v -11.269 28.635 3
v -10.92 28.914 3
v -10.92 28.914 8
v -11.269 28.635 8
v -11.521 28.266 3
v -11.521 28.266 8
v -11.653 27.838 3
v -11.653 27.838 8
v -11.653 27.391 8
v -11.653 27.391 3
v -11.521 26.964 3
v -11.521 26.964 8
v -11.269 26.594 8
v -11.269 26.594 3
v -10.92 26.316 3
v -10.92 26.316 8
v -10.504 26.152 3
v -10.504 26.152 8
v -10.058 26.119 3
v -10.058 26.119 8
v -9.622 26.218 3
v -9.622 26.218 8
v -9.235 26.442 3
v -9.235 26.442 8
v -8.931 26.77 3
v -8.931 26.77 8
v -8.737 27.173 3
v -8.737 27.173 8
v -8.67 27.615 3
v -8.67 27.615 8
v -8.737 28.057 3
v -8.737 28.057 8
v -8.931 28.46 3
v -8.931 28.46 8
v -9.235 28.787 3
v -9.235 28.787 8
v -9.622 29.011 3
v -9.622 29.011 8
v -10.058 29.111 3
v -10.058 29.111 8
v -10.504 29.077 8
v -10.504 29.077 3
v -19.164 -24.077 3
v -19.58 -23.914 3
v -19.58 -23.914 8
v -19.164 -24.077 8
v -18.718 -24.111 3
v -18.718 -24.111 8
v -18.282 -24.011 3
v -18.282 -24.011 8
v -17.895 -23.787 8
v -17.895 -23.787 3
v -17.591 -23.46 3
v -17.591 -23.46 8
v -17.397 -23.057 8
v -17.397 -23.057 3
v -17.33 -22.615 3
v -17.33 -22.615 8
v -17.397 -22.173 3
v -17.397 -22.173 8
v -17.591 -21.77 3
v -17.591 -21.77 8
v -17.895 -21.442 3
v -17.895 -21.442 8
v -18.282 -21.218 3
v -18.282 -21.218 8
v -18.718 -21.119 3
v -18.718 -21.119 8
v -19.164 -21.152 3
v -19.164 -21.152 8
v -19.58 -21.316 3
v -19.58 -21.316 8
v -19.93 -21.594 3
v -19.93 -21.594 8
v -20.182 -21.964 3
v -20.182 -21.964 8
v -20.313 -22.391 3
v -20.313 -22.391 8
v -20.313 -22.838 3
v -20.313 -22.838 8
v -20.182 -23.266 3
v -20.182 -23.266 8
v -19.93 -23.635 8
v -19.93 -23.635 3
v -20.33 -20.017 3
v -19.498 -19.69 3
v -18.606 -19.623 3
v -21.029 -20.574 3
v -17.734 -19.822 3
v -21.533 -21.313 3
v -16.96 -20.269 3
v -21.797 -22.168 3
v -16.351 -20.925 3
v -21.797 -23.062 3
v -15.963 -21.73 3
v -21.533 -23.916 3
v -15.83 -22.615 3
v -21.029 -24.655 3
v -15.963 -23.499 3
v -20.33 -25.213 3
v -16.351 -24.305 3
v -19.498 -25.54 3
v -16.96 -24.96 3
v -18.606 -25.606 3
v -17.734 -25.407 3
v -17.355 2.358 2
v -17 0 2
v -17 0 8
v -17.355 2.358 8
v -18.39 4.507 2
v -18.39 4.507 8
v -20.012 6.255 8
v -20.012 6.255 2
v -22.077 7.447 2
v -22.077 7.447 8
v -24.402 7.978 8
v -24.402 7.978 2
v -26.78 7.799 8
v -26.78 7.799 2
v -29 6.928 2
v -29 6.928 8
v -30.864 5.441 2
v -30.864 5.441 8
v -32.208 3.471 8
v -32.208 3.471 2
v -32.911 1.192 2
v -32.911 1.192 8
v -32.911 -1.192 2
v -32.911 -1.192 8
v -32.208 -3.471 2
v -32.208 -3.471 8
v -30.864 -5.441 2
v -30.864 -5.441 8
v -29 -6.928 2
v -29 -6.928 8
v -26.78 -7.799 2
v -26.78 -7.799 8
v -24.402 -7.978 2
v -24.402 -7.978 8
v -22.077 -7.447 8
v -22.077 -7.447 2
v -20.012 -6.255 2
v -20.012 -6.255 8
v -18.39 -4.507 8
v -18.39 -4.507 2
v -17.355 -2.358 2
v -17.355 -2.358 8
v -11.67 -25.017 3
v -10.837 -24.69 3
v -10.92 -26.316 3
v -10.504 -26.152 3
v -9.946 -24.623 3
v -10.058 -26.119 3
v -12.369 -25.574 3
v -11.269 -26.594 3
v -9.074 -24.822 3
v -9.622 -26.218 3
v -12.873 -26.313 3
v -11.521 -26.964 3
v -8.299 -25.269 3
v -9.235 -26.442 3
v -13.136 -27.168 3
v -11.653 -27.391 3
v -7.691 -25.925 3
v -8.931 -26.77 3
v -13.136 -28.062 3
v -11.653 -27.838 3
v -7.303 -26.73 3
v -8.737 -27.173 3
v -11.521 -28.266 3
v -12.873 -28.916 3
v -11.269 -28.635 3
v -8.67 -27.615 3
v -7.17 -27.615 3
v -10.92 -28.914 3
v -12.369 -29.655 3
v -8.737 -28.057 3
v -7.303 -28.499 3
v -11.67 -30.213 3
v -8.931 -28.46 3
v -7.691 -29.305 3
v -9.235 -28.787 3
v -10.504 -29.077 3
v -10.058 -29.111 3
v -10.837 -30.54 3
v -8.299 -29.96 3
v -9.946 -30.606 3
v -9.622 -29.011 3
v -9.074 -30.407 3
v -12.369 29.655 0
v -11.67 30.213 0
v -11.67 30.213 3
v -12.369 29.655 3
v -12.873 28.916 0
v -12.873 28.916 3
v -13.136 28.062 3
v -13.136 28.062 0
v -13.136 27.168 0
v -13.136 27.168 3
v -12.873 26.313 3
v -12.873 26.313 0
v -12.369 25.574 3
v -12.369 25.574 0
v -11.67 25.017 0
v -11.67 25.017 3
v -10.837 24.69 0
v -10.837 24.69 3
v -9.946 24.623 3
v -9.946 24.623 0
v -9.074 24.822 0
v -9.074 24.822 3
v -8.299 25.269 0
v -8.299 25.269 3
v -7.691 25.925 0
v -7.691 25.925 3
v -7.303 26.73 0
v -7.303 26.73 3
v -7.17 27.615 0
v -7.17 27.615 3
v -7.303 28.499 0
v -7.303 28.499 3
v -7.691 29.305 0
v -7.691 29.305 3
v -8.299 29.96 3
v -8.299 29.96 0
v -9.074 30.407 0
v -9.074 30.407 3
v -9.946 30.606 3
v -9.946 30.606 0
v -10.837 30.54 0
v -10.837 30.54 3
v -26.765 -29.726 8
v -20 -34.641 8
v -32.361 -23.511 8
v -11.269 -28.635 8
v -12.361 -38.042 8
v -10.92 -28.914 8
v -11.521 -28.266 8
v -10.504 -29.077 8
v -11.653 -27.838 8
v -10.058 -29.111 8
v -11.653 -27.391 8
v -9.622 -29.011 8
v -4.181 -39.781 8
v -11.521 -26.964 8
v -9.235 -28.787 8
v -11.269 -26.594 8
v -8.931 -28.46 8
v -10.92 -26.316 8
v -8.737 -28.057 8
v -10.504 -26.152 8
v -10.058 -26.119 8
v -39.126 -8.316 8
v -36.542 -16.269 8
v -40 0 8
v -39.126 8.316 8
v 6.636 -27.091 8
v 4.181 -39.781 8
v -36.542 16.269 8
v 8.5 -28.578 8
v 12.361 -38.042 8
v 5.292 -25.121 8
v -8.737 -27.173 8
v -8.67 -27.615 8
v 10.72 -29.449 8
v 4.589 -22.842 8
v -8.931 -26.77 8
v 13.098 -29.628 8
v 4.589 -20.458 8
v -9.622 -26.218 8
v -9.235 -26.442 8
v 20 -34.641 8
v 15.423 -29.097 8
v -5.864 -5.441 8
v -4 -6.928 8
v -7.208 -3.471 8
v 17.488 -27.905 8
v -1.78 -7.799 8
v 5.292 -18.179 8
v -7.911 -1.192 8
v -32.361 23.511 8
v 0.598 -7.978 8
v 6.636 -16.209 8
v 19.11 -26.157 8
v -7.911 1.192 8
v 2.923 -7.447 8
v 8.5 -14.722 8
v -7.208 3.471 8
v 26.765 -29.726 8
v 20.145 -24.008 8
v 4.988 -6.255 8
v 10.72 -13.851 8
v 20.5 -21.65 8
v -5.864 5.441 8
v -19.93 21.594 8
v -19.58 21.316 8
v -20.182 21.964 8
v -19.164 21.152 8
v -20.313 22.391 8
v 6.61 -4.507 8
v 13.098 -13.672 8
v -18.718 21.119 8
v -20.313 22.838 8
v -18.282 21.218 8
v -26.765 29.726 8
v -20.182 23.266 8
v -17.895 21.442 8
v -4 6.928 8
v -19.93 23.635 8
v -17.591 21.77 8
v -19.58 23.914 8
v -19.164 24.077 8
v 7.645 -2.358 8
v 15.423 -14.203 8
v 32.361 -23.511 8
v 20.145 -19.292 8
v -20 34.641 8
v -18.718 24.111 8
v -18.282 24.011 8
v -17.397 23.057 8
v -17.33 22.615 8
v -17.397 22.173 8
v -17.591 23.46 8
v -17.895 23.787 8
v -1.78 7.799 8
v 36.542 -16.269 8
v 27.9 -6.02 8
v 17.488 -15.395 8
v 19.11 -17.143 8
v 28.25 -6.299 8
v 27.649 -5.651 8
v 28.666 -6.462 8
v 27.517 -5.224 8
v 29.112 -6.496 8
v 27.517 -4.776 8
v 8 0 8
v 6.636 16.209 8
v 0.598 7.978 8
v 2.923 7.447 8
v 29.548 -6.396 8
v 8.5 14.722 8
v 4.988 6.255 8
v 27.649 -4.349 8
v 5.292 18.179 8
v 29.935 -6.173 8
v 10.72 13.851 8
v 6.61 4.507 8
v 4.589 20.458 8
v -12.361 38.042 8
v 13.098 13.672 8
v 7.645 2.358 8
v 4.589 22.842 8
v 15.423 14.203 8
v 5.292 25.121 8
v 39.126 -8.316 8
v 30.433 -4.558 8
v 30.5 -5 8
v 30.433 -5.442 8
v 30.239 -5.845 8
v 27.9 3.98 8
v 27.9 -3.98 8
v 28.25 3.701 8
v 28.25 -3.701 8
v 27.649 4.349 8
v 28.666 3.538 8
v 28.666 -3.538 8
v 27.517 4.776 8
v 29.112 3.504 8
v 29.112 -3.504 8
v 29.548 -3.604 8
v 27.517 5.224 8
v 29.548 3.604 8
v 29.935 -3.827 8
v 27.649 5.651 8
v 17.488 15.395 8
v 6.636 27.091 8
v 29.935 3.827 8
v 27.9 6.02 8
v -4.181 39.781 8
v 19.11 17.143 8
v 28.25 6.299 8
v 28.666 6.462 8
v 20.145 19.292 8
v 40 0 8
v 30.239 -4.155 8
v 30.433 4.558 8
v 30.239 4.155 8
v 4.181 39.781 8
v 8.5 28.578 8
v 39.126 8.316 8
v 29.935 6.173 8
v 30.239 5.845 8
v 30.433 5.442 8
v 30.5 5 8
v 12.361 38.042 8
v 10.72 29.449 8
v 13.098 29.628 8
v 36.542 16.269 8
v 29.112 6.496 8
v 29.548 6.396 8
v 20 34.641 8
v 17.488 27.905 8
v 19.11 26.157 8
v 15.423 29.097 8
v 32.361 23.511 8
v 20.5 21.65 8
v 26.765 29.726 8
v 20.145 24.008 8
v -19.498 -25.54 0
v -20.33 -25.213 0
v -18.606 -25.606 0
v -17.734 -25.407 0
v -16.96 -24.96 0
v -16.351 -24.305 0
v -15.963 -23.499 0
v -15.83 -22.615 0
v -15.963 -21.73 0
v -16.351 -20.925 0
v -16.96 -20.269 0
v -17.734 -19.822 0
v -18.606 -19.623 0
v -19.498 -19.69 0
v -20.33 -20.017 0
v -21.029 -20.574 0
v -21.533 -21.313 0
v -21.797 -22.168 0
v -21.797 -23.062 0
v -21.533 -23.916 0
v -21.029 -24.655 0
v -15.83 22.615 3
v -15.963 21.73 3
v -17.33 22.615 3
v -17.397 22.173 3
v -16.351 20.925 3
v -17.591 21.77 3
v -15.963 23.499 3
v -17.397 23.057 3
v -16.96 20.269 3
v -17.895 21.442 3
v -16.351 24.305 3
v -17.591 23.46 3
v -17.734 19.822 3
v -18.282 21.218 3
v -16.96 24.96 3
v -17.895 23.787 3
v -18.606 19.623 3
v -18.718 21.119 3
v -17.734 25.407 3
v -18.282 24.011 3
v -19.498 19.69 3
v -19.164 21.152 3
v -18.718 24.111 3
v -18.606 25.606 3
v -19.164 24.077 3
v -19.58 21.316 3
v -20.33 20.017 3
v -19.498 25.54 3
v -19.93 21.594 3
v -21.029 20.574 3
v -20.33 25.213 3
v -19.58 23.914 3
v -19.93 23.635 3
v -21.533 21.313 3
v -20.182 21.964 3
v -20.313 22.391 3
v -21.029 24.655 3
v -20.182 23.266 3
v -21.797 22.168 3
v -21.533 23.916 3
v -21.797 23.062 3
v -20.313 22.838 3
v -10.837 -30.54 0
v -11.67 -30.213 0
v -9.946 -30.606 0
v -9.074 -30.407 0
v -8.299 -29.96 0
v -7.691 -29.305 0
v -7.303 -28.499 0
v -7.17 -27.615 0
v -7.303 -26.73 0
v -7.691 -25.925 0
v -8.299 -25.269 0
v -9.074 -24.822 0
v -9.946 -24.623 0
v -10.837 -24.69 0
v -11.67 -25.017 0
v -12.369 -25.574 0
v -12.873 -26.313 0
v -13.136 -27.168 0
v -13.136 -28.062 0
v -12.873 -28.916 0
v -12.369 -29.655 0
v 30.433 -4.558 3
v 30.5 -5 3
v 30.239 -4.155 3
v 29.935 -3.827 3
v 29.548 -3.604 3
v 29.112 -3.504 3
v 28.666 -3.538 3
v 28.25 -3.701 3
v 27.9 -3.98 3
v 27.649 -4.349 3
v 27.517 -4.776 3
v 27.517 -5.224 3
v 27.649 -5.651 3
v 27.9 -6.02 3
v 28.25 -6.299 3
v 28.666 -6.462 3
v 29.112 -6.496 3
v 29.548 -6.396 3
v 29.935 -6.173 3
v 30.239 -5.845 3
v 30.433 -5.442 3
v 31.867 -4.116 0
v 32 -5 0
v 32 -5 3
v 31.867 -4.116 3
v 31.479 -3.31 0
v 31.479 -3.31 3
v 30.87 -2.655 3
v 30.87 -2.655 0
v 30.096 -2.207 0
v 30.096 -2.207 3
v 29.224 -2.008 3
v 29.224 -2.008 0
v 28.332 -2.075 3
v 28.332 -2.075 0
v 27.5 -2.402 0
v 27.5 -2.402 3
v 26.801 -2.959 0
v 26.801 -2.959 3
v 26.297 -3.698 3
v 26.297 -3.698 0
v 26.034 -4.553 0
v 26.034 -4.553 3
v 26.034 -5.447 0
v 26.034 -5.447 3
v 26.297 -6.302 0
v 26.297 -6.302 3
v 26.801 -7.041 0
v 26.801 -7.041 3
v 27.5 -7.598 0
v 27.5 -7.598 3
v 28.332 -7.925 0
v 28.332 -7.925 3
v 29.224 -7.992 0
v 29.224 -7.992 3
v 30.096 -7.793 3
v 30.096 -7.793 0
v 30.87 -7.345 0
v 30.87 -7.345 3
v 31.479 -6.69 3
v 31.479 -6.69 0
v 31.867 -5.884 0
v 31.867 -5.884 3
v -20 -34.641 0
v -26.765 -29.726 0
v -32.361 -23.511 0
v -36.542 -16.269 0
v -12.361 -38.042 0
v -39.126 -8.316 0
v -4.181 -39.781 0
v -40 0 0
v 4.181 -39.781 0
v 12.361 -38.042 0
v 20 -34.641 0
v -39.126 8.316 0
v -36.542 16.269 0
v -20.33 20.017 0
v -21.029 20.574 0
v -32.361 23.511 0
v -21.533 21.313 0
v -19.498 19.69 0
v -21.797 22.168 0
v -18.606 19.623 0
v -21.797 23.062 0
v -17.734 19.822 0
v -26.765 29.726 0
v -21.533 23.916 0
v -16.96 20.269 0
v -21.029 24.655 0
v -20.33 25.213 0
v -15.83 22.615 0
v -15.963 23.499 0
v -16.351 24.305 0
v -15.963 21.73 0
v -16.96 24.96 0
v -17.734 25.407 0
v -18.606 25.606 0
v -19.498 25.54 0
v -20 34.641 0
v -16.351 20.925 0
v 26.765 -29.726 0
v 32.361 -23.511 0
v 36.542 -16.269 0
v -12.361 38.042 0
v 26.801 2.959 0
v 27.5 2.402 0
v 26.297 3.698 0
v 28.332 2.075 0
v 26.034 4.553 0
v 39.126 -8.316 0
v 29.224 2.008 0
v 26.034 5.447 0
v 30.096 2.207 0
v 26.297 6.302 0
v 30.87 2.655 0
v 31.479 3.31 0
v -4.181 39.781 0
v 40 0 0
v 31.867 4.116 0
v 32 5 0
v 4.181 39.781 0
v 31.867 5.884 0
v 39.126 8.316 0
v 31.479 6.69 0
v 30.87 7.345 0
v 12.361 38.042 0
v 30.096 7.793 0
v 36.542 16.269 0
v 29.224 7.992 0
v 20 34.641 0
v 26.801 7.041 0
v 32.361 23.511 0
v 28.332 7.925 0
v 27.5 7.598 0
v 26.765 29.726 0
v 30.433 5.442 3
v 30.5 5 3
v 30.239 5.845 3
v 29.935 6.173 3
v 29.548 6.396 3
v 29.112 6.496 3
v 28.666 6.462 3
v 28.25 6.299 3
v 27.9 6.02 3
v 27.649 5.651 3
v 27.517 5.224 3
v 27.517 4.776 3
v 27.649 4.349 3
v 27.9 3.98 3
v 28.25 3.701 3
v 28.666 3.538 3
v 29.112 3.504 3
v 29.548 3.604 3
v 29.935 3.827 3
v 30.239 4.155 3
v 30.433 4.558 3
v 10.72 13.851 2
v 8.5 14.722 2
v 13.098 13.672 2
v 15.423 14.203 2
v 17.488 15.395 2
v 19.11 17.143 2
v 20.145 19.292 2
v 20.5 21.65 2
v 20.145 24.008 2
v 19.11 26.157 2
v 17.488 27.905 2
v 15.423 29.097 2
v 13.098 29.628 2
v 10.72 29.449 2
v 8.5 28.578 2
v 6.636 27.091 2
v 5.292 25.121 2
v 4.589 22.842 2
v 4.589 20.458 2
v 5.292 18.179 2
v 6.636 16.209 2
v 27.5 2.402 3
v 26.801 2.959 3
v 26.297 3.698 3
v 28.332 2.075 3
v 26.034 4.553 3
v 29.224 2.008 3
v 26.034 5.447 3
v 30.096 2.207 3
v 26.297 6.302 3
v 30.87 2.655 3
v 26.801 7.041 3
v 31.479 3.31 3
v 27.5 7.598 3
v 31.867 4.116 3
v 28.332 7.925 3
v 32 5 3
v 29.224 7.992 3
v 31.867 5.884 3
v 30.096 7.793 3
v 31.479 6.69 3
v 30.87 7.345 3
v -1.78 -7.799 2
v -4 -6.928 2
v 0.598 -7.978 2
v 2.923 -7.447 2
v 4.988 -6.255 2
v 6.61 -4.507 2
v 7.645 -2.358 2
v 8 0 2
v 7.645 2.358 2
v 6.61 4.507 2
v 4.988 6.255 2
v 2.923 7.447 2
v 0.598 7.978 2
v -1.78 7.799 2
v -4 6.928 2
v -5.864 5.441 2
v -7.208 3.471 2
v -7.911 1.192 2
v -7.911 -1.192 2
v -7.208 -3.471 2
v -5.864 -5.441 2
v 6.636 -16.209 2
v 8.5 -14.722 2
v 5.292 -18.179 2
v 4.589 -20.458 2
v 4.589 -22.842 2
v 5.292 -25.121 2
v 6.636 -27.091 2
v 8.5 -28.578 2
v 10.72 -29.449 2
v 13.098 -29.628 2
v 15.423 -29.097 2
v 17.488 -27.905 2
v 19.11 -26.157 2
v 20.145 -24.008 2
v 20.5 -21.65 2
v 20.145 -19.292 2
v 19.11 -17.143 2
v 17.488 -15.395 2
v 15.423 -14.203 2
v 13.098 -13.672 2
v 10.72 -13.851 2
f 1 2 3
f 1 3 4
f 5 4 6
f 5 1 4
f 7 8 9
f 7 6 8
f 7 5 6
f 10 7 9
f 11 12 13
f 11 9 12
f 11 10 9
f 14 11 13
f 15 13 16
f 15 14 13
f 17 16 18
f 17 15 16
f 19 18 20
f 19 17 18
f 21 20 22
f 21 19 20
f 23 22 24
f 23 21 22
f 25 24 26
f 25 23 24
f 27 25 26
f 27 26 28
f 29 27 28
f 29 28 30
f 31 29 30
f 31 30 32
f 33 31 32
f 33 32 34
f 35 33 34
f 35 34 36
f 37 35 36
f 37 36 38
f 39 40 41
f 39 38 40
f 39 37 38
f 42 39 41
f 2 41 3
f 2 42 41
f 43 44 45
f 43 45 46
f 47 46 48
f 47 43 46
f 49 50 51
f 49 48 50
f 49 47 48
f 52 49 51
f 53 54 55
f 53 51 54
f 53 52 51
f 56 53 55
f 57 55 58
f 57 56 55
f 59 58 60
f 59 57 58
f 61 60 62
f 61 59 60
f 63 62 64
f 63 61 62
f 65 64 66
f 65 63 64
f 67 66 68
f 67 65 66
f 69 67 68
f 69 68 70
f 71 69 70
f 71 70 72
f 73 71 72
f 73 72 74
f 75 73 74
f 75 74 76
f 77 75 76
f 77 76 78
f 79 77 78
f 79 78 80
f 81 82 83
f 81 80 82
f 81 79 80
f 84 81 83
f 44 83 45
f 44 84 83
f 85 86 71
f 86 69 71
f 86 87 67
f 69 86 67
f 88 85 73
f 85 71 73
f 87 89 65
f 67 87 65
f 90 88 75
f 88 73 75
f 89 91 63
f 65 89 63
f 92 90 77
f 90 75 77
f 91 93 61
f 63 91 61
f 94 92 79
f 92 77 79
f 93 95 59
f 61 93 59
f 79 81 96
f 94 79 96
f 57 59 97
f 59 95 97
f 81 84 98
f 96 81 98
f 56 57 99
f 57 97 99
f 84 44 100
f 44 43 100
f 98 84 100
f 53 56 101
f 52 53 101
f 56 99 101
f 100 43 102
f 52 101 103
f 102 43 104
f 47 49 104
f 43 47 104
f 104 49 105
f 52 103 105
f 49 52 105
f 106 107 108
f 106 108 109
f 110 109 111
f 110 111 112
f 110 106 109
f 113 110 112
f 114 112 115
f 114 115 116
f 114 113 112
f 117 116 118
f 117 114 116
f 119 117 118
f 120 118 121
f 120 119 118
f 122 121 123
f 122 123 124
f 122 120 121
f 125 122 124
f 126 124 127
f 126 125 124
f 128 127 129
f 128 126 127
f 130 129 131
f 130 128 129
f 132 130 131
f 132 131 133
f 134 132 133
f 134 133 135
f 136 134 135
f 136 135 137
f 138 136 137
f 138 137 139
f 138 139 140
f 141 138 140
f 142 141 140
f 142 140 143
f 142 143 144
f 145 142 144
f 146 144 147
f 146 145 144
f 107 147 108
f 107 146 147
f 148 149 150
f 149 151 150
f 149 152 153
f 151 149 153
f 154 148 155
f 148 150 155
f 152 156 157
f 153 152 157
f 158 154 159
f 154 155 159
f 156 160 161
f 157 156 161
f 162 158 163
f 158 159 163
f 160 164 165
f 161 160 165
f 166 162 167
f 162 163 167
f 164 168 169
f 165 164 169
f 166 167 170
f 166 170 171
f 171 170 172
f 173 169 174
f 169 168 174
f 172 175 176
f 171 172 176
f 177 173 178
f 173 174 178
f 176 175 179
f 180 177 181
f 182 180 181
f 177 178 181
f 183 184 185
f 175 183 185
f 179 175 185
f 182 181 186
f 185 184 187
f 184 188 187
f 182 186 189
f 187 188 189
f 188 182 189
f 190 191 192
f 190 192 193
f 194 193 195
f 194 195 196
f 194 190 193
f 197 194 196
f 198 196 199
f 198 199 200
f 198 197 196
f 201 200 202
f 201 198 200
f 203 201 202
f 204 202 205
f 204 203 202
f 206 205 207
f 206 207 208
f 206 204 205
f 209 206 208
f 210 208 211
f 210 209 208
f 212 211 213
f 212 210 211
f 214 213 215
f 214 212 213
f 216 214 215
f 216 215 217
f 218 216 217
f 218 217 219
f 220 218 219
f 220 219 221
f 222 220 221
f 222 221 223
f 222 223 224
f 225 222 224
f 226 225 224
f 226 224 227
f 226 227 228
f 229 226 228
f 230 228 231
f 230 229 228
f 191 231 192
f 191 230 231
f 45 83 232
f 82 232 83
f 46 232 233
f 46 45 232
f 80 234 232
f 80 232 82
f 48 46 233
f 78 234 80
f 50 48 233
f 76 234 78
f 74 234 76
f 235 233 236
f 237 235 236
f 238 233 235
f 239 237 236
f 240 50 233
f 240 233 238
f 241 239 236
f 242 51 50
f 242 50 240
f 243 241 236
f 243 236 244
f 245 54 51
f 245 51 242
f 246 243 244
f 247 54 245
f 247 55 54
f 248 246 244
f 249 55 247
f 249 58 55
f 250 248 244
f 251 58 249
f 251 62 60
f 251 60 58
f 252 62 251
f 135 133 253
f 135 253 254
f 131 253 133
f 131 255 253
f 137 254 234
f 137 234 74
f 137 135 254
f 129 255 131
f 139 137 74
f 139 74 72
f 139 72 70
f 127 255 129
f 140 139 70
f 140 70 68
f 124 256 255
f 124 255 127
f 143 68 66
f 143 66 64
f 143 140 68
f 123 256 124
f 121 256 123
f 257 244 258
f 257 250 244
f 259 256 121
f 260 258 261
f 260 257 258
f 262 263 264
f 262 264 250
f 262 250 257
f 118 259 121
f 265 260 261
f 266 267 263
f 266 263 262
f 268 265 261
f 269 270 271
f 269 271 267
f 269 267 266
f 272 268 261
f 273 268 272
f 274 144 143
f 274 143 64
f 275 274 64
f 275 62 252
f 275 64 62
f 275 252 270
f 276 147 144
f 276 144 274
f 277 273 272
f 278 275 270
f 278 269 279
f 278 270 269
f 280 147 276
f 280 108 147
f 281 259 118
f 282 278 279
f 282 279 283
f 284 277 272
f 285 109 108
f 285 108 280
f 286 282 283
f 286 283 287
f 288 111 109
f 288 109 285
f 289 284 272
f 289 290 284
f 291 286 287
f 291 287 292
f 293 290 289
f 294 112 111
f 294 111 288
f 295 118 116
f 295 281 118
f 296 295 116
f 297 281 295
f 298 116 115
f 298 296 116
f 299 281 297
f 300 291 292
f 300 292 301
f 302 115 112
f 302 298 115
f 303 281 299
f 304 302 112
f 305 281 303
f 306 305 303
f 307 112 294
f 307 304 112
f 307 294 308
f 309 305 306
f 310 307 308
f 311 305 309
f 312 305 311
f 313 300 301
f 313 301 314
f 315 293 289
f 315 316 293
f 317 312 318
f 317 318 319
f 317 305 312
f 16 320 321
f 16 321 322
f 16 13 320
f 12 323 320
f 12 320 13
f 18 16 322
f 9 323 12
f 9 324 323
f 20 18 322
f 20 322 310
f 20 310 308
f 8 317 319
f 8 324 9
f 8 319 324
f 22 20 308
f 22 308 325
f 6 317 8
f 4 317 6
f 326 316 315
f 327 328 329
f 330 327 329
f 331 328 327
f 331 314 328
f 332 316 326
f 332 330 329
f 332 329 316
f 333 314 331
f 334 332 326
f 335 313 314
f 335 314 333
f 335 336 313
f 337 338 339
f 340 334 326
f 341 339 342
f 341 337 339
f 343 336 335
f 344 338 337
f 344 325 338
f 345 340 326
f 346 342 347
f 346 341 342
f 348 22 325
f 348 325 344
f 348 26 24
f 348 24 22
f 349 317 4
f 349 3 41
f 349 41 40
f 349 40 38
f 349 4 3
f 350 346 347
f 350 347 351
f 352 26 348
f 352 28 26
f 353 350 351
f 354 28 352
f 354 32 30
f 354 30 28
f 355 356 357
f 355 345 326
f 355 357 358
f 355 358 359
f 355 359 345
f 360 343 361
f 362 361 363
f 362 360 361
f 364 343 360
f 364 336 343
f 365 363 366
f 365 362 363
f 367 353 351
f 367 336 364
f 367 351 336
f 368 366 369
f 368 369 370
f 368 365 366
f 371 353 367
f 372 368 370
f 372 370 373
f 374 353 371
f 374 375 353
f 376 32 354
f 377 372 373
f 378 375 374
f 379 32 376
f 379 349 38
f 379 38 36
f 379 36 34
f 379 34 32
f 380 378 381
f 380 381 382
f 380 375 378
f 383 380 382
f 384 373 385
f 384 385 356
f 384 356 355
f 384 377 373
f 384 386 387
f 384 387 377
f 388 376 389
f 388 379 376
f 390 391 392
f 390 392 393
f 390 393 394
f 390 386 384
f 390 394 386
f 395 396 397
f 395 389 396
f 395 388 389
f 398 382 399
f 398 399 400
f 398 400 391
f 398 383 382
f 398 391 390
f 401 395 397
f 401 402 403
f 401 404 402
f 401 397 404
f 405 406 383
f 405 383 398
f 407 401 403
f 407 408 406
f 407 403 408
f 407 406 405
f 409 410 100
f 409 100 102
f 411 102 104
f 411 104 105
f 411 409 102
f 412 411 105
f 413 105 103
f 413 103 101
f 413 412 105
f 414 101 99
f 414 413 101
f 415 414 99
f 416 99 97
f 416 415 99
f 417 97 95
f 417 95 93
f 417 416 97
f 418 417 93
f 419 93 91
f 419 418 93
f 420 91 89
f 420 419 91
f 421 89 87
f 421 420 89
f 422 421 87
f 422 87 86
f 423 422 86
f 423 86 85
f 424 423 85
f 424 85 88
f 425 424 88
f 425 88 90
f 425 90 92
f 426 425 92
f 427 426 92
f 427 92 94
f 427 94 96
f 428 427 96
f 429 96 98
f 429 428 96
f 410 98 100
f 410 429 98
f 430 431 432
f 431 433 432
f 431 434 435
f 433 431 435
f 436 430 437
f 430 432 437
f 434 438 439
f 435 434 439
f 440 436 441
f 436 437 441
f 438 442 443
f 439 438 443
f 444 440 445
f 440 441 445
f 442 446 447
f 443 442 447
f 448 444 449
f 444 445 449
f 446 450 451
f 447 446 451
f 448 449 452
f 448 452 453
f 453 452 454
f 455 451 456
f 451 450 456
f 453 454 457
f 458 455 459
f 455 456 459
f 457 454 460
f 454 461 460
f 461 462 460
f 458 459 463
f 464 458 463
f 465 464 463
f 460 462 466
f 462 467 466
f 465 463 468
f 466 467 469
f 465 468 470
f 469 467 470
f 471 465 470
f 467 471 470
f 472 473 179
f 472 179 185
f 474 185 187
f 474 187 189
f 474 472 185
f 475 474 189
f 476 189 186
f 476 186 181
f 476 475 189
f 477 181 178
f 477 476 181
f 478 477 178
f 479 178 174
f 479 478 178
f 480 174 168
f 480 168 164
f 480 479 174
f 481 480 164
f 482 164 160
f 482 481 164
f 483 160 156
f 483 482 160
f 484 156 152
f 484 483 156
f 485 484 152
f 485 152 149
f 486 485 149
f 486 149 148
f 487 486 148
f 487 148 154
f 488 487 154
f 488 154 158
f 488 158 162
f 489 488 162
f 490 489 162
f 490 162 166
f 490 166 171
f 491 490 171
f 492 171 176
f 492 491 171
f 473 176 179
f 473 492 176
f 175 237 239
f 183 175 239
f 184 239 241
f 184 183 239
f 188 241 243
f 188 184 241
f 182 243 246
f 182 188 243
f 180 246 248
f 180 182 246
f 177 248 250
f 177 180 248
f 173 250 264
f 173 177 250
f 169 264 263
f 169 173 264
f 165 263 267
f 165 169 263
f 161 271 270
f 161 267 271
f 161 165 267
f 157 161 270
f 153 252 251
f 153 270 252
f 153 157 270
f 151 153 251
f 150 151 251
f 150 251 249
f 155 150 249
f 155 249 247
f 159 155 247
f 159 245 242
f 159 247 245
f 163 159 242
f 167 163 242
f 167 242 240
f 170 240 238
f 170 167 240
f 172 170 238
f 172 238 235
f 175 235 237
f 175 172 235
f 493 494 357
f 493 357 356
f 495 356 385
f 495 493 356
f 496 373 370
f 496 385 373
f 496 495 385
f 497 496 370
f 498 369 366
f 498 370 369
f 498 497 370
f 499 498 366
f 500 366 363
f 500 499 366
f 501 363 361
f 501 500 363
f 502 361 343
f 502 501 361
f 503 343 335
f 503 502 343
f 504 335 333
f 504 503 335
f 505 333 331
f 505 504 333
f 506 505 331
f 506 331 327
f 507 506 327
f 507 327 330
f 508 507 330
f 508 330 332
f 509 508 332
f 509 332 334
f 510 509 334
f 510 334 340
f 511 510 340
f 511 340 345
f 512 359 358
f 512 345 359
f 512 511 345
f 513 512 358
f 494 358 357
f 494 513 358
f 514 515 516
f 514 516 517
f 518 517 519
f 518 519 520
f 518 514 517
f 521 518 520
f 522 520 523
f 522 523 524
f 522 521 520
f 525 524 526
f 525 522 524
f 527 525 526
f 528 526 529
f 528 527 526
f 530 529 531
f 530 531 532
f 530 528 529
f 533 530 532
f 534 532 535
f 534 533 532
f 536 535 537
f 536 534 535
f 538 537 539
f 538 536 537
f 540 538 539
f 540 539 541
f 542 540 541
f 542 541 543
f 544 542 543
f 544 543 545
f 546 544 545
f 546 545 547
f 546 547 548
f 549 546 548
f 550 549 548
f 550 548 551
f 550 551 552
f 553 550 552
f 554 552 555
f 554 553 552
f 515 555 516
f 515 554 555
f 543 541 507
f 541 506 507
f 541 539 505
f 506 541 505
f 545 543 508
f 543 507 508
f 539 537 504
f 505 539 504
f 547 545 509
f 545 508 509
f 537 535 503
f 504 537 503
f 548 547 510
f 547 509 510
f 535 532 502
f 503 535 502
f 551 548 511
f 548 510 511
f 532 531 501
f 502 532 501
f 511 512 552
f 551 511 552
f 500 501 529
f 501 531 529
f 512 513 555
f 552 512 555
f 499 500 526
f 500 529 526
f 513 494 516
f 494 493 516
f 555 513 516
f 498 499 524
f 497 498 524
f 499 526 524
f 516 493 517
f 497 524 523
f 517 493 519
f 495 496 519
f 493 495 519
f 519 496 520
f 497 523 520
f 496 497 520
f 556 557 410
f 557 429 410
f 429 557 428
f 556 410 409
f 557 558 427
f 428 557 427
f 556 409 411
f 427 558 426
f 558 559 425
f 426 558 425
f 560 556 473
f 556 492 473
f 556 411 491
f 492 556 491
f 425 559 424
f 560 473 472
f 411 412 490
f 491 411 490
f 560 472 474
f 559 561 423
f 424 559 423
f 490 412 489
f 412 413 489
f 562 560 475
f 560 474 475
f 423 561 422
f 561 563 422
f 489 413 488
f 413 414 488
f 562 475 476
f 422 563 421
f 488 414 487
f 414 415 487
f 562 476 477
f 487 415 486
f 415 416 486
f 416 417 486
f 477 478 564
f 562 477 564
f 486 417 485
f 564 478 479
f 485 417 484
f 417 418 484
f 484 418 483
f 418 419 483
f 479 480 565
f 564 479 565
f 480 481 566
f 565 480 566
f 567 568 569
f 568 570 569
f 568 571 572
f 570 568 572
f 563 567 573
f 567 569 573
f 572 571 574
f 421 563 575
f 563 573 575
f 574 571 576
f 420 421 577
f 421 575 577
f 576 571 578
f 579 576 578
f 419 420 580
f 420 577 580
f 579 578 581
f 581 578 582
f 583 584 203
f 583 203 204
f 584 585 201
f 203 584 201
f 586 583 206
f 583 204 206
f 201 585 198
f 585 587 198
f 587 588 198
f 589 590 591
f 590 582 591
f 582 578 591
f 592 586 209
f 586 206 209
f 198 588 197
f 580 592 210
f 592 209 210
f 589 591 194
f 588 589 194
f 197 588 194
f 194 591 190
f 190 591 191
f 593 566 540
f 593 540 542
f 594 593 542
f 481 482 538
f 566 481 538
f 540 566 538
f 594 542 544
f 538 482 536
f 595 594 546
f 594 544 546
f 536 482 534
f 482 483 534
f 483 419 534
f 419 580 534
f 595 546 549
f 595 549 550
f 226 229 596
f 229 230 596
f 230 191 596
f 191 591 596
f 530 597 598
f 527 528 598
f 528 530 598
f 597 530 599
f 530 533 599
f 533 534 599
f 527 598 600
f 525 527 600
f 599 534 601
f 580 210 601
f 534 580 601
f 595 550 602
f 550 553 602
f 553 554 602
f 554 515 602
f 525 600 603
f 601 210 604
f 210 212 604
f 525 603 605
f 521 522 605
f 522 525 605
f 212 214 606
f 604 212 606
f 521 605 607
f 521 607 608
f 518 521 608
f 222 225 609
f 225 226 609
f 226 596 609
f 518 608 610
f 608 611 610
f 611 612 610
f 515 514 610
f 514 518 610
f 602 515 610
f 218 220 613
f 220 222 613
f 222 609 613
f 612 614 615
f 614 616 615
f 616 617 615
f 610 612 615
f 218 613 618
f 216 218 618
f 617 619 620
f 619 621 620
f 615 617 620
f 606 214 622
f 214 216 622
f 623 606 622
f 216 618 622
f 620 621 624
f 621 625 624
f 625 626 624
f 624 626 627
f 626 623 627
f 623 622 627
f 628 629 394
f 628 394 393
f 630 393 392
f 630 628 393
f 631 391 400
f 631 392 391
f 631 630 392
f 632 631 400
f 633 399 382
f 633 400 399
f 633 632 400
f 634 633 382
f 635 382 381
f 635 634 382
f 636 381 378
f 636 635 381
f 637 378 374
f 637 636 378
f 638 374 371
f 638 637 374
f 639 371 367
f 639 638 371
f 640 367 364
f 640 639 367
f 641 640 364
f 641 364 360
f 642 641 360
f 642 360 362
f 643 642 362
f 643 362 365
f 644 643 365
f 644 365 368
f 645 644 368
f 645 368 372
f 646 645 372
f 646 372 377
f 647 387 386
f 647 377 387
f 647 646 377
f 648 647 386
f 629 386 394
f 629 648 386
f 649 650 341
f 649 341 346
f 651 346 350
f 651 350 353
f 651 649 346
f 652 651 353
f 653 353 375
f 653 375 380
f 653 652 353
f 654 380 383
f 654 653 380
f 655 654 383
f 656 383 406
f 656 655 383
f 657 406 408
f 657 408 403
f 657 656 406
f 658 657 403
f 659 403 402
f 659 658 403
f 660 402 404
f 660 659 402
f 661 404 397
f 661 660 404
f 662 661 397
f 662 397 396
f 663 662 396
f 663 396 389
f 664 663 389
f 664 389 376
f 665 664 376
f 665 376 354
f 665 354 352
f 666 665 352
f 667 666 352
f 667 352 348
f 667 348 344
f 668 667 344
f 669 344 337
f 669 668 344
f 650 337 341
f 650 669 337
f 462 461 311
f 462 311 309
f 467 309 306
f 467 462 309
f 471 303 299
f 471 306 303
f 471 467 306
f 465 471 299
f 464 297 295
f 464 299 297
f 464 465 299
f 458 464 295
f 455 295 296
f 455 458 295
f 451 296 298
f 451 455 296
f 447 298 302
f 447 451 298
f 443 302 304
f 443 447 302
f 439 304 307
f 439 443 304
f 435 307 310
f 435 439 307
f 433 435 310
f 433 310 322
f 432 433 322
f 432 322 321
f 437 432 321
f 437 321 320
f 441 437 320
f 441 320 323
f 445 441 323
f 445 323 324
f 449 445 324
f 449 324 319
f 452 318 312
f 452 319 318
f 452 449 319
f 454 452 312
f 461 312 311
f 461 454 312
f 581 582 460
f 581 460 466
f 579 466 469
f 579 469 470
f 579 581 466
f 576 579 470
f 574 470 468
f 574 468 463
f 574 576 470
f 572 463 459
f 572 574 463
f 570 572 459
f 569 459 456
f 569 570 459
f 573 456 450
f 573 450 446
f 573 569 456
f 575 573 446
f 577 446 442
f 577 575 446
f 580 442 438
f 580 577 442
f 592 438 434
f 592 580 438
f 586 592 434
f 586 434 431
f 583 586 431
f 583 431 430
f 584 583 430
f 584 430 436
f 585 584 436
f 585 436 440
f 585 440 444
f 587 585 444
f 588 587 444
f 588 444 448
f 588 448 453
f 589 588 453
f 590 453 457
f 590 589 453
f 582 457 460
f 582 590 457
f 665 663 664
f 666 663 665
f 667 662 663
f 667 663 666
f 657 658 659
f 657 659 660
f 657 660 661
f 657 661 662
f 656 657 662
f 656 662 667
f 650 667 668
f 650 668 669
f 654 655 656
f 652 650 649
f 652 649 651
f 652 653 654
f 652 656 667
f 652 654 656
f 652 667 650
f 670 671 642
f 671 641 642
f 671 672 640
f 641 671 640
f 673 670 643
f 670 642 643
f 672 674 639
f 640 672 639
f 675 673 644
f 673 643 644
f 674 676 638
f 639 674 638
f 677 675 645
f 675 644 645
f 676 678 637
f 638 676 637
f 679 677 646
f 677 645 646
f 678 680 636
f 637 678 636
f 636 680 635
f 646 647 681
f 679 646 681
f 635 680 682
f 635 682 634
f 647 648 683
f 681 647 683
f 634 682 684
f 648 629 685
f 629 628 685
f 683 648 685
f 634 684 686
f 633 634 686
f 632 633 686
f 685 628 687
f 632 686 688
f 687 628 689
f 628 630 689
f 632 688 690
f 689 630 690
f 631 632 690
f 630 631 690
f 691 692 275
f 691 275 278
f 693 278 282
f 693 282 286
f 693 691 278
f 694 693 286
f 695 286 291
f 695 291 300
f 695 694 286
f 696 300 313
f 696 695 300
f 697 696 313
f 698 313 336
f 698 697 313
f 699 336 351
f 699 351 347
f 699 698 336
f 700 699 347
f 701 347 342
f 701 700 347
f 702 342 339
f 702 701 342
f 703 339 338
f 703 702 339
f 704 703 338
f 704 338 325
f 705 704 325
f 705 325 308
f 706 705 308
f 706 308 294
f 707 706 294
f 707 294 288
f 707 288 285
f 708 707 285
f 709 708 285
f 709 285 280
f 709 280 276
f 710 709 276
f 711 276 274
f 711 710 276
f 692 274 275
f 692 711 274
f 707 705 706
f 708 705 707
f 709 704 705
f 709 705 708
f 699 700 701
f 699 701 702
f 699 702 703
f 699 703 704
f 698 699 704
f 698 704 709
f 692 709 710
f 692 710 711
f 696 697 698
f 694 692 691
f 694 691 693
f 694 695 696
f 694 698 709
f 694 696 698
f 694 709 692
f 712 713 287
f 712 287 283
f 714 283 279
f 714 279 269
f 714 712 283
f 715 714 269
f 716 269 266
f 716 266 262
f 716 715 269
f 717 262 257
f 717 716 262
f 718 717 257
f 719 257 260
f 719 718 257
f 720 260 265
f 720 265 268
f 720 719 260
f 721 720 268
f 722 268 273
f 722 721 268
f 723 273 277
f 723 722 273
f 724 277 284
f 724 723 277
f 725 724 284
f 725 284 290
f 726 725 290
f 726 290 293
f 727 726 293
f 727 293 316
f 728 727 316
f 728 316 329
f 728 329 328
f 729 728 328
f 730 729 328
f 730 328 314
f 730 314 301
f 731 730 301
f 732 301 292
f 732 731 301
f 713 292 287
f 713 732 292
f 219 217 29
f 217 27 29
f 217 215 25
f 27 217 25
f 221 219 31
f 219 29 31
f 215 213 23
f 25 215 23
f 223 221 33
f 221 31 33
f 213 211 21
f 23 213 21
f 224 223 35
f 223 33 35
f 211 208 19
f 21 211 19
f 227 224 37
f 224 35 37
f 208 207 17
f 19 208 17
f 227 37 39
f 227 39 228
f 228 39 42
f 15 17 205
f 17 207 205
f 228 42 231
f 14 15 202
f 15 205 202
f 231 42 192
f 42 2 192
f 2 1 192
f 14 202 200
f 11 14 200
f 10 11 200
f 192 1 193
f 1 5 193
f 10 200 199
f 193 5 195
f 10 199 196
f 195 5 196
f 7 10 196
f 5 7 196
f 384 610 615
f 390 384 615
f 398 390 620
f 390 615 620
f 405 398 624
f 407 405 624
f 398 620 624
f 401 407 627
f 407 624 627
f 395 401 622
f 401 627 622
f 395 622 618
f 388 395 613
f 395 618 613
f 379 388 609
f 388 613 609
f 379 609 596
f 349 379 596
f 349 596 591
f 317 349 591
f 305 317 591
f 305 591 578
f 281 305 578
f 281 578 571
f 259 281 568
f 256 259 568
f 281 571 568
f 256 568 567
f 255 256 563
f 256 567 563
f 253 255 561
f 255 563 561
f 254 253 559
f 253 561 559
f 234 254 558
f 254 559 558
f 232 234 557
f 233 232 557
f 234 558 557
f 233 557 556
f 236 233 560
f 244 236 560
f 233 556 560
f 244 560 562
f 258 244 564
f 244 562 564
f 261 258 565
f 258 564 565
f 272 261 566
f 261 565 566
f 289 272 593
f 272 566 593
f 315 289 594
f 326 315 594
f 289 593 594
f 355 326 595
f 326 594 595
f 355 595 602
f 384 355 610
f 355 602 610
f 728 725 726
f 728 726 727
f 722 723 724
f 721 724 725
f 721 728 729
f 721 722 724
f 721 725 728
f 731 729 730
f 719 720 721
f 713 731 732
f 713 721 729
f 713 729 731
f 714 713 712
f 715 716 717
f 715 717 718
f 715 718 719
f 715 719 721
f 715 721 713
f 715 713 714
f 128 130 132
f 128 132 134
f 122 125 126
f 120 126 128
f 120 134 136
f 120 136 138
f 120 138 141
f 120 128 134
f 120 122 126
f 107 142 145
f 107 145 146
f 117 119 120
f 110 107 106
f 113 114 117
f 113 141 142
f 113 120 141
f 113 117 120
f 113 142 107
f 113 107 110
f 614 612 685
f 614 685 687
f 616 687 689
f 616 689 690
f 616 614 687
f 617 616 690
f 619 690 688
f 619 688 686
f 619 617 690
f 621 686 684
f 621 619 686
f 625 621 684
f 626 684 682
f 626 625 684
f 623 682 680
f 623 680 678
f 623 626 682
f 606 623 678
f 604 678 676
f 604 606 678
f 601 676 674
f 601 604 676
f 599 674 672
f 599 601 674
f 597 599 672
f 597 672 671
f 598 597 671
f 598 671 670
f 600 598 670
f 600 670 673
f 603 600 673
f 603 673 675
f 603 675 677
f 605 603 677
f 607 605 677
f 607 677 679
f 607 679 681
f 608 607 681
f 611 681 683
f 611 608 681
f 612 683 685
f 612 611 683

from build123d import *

# Parameters (mm, degrees)
CYLINDER271_R               = 8
CYLINDER271_DEPTH           = 6
CYLINDER271_PLACEMENT_ANGLE = 240
CYLINDER272_R               = 3
CYLINDER272_DEPTH           = 3
CYLINDER232_R               = 3
CYLINDER232_DEPTH           = 3
COMPOUND244_PLACEMENT_ANGLE = 240
COMPOUND214_PLACEMENT_ANGLE = 120
CYLINDER233_R               = 1.5
CYLINDER233_DEPTH           = 60
CYLINDER234_R               = 1.5
CYLINDER234_DEPTH           = 60
COMPOUND240_PLACEMENT_ANGLE = 240
COMPOUND215_PLACEMENT_ANGLE = 120
CYLINDER268_R               = 15
CYLINDER268_DEPTH           = 20
CYLINDER269_R               = 8
CYLINDER269_DEPTH           = 6
CYLINDER269_PLACEMENT_ANGLE = 120
CYLINDER231_R               = 8
CYLINDER231_DEPTH           = 6
CYLINDER231_PLACEMENT_ANGLE = 240
CYLINDER270_R               = 8
CYLINDER270_DEPTH           = 6
CYLINDER267_R               = 40
CYLINDER267_DEPTH           = 8


with BuildPart() as v_lec271:
    # Cylinder271 → Cylinder271 (new body)
    with BuildSketch(Plane.XY):
        Circle(CYLINDER271_R)
    extrude(amount=CYLINDER271_DEPTH)


with BuildPart() as v_lec271_1:
    # Cylinder271 placement: moved
    add(v_lec271.part.moved(Location((0, 0, 2))).rotate(Axis((0, 0, 2), (0, 0, 1)), CYLINDER271_PLACEMENT_ANGLE))


with BuildPart() as v_lec272:
    # Cylinder272 → Cylinder272 (new body)
    with BuildSketch(Plane(origin=(29, -5, -6), x_dir=(1, 0, 0), z_dir=(0, 0, 1))):
        Circle(CYLINDER272_R)
    extrude(amount=CYLINDER272_DEPTH)


with BuildPart() as v_lec232:
    # Cylinder232 → Cylinder232 (new body)
    with BuildSketch(Plane(origin=(29, 5, -6), x_dir=(1, 0, 0), z_dir=(0, 0, 1))):
        Circle(CYLINDER232_R)
    extrude(amount=CYLINDER232_DEPTH)


with BuildPart() as compound244:
    # Compound244 base: copy of Válec232
    add(v_lec232.part)

    # Compound244: union Válec272
    add(v_lec272.part)


with BuildPart() as compound244_1:
    # Compound244 placement: moved
    add(compound244.part.moved(Location((0, 0, 6))).rotate(Axis((0, 0, 6), (0, 0, 1)), COMPOUND244_PLACEMENT_ANGLE))


with BuildPart() as compound246:
    # Compound246 base: copy of Válec232
    add(v_lec232.part)

    # Compound246: union Válec272
    add(v_lec272.part)


with BuildPart() as compound246_1:
    # Compound246 placement: moved
    add(compound246.part.moved(Location((0, 0, 6))))


with BuildPart() as compound242:
    # Compound214 base: copy of Válec232
    add(v_lec232.part)

    # Compound214: union Válec272
    add(v_lec272.part)


with BuildPart() as compound242_1:
    # Compound214 placement: moved
    add(compound242.part.moved(Location((0, 0, 6))).rotate(Axis((0, 0, 6), (0, 0, 1)), COMPOUND214_PLACEMENT_ANGLE))

    # Compound242: union Compound244, Compound246
    add(compound244_1.part)
    add(compound246_1.part)


with BuildPart() as v_lec233:
    # Cylinder233 → Cylinder233 (new body)
    with BuildSketch(Plane(origin=(29, -5, -6), x_dir=(1, 0, 0), z_dir=(0, 0, 1))):
        Circle(CYLINDER233_R)
    extrude(amount=CYLINDER233_DEPTH)


with BuildPart() as v_lec234:
    # Cylinder234 → Cylinder234 (new body)
    with BuildSketch(Plane(origin=(29, 5, -6), x_dir=(1, 0, 0), z_dir=(0, 0, 1))):
        Circle(CYLINDER234_R)
    extrude(amount=CYLINDER234_DEPTH)


with BuildPart() as compound240:
    # Compound240 base: copy of Válec234
    add(v_lec234.part)

    # Compound240: union Válec233
    add(v_lec233.part)


with BuildPart() as compound240_1:
    # Compound240 placement: moved
    add(compound240.part.rotate(Axis((0, 0, 0), (0, 0, 1)), COMPOUND240_PLACEMENT_ANGLE))


with BuildPart() as compound243:
    # Compound243 base: copy of Válec234
    add(v_lec234.part)

    # Compound243: union Válec233
    add(v_lec233.part)


with BuildPart() as compound238:
    # Compound215 base: copy of Válec234
    add(v_lec234.part)

    # Compound215: union Válec233
    add(v_lec233.part)


with BuildPart() as compound238_1:
    # Compound215 placement: moved
    add(compound238.part.rotate(Axis((0, 0, 0), (0, 0, 1)), COMPOUND215_PLACEMENT_ANGLE))

    # Compound238: union Compound240, Compound243
    add(compound240_1.part)
    add(compound243.part)


with BuildPart() as v_lec268:
    # Cylinder268 → Cylinder268 (new body)
    with BuildSketch(Plane.XY.offset(-100)):
        Circle(CYLINDER268_R)
    extrude(amount=CYLINDER268_DEPTH)


with BuildPart() as v_lec269:
    # Cylinder269 → Cylinder269 (new body)
    with BuildSketch(Plane.XY):
        Circle(CYLINDER269_R)
    extrude(amount=CYLINDER269_DEPTH)


with BuildPart() as v_lec269_1:
    # Cylinder269 placement: moved
    add(v_lec269.part.moved(Location((12.5, -21.65, 2))).rotate(Axis((12.5, -21.65, 2), (0, 0, 1)), CYLINDER269_PLACEMENT_ANGLE))


with BuildPart() as v_lec231:
    # Cylinder231 → Cylinder231 (new body)
    with BuildSketch(Plane.XY):
        Circle(CYLINDER231_R)
    extrude(amount=CYLINDER231_DEPTH)


with BuildPart() as v_lec231_1:
    # Cylinder231 placement: moved
    add(v_lec231.part.moved(Location((12.5, 21.65, 2))).rotate(Axis((12.5, 21.65, 2), (0, 0, 1)), CYLINDER231_PLACEMENT_ANGLE))


with BuildPart() as compound239:
    # Cylinder270 → Cylinder270 (new body)
    with BuildSketch(Plane(origin=(-25, 0, 2), x_dir=(1, 0, 0), z_dir=(0, 0, 1))):
        Circle(CYLINDER270_R)
    extrude(amount=CYLINDER270_DEPTH)

    # Compound239: union Válec269, Válec231
    add(v_lec269_1.part)
    add(v_lec231_1.part)


with BuildPart() as cut116:
    # Cylinder267 → Cylinder267 (new body)
    with BuildSketch(Plane.XY):
        Circle(CYLINDER267_R)
    extrude(amount=CYLINDER267_DEPTH)

    # Cut113: cut Compound239
    add(compound239.part, mode=Mode.SUBTRACT)

    # Cut112: cut Válec268
    add(v_lec268.part, mode=Mode.SUBTRACT)

    # Cut114: cut Compound238
    add(compound238_1.part, mode=Mode.SUBTRACT)

    # Cut115: cut Compound242
    add(compound242_1.part, mode=Mode.SUBTRACT)

    # Cut116: cut Válec271
    add(v_lec271_1.part, mode=Mode.SUBTRACT)


solid = cut116.part
